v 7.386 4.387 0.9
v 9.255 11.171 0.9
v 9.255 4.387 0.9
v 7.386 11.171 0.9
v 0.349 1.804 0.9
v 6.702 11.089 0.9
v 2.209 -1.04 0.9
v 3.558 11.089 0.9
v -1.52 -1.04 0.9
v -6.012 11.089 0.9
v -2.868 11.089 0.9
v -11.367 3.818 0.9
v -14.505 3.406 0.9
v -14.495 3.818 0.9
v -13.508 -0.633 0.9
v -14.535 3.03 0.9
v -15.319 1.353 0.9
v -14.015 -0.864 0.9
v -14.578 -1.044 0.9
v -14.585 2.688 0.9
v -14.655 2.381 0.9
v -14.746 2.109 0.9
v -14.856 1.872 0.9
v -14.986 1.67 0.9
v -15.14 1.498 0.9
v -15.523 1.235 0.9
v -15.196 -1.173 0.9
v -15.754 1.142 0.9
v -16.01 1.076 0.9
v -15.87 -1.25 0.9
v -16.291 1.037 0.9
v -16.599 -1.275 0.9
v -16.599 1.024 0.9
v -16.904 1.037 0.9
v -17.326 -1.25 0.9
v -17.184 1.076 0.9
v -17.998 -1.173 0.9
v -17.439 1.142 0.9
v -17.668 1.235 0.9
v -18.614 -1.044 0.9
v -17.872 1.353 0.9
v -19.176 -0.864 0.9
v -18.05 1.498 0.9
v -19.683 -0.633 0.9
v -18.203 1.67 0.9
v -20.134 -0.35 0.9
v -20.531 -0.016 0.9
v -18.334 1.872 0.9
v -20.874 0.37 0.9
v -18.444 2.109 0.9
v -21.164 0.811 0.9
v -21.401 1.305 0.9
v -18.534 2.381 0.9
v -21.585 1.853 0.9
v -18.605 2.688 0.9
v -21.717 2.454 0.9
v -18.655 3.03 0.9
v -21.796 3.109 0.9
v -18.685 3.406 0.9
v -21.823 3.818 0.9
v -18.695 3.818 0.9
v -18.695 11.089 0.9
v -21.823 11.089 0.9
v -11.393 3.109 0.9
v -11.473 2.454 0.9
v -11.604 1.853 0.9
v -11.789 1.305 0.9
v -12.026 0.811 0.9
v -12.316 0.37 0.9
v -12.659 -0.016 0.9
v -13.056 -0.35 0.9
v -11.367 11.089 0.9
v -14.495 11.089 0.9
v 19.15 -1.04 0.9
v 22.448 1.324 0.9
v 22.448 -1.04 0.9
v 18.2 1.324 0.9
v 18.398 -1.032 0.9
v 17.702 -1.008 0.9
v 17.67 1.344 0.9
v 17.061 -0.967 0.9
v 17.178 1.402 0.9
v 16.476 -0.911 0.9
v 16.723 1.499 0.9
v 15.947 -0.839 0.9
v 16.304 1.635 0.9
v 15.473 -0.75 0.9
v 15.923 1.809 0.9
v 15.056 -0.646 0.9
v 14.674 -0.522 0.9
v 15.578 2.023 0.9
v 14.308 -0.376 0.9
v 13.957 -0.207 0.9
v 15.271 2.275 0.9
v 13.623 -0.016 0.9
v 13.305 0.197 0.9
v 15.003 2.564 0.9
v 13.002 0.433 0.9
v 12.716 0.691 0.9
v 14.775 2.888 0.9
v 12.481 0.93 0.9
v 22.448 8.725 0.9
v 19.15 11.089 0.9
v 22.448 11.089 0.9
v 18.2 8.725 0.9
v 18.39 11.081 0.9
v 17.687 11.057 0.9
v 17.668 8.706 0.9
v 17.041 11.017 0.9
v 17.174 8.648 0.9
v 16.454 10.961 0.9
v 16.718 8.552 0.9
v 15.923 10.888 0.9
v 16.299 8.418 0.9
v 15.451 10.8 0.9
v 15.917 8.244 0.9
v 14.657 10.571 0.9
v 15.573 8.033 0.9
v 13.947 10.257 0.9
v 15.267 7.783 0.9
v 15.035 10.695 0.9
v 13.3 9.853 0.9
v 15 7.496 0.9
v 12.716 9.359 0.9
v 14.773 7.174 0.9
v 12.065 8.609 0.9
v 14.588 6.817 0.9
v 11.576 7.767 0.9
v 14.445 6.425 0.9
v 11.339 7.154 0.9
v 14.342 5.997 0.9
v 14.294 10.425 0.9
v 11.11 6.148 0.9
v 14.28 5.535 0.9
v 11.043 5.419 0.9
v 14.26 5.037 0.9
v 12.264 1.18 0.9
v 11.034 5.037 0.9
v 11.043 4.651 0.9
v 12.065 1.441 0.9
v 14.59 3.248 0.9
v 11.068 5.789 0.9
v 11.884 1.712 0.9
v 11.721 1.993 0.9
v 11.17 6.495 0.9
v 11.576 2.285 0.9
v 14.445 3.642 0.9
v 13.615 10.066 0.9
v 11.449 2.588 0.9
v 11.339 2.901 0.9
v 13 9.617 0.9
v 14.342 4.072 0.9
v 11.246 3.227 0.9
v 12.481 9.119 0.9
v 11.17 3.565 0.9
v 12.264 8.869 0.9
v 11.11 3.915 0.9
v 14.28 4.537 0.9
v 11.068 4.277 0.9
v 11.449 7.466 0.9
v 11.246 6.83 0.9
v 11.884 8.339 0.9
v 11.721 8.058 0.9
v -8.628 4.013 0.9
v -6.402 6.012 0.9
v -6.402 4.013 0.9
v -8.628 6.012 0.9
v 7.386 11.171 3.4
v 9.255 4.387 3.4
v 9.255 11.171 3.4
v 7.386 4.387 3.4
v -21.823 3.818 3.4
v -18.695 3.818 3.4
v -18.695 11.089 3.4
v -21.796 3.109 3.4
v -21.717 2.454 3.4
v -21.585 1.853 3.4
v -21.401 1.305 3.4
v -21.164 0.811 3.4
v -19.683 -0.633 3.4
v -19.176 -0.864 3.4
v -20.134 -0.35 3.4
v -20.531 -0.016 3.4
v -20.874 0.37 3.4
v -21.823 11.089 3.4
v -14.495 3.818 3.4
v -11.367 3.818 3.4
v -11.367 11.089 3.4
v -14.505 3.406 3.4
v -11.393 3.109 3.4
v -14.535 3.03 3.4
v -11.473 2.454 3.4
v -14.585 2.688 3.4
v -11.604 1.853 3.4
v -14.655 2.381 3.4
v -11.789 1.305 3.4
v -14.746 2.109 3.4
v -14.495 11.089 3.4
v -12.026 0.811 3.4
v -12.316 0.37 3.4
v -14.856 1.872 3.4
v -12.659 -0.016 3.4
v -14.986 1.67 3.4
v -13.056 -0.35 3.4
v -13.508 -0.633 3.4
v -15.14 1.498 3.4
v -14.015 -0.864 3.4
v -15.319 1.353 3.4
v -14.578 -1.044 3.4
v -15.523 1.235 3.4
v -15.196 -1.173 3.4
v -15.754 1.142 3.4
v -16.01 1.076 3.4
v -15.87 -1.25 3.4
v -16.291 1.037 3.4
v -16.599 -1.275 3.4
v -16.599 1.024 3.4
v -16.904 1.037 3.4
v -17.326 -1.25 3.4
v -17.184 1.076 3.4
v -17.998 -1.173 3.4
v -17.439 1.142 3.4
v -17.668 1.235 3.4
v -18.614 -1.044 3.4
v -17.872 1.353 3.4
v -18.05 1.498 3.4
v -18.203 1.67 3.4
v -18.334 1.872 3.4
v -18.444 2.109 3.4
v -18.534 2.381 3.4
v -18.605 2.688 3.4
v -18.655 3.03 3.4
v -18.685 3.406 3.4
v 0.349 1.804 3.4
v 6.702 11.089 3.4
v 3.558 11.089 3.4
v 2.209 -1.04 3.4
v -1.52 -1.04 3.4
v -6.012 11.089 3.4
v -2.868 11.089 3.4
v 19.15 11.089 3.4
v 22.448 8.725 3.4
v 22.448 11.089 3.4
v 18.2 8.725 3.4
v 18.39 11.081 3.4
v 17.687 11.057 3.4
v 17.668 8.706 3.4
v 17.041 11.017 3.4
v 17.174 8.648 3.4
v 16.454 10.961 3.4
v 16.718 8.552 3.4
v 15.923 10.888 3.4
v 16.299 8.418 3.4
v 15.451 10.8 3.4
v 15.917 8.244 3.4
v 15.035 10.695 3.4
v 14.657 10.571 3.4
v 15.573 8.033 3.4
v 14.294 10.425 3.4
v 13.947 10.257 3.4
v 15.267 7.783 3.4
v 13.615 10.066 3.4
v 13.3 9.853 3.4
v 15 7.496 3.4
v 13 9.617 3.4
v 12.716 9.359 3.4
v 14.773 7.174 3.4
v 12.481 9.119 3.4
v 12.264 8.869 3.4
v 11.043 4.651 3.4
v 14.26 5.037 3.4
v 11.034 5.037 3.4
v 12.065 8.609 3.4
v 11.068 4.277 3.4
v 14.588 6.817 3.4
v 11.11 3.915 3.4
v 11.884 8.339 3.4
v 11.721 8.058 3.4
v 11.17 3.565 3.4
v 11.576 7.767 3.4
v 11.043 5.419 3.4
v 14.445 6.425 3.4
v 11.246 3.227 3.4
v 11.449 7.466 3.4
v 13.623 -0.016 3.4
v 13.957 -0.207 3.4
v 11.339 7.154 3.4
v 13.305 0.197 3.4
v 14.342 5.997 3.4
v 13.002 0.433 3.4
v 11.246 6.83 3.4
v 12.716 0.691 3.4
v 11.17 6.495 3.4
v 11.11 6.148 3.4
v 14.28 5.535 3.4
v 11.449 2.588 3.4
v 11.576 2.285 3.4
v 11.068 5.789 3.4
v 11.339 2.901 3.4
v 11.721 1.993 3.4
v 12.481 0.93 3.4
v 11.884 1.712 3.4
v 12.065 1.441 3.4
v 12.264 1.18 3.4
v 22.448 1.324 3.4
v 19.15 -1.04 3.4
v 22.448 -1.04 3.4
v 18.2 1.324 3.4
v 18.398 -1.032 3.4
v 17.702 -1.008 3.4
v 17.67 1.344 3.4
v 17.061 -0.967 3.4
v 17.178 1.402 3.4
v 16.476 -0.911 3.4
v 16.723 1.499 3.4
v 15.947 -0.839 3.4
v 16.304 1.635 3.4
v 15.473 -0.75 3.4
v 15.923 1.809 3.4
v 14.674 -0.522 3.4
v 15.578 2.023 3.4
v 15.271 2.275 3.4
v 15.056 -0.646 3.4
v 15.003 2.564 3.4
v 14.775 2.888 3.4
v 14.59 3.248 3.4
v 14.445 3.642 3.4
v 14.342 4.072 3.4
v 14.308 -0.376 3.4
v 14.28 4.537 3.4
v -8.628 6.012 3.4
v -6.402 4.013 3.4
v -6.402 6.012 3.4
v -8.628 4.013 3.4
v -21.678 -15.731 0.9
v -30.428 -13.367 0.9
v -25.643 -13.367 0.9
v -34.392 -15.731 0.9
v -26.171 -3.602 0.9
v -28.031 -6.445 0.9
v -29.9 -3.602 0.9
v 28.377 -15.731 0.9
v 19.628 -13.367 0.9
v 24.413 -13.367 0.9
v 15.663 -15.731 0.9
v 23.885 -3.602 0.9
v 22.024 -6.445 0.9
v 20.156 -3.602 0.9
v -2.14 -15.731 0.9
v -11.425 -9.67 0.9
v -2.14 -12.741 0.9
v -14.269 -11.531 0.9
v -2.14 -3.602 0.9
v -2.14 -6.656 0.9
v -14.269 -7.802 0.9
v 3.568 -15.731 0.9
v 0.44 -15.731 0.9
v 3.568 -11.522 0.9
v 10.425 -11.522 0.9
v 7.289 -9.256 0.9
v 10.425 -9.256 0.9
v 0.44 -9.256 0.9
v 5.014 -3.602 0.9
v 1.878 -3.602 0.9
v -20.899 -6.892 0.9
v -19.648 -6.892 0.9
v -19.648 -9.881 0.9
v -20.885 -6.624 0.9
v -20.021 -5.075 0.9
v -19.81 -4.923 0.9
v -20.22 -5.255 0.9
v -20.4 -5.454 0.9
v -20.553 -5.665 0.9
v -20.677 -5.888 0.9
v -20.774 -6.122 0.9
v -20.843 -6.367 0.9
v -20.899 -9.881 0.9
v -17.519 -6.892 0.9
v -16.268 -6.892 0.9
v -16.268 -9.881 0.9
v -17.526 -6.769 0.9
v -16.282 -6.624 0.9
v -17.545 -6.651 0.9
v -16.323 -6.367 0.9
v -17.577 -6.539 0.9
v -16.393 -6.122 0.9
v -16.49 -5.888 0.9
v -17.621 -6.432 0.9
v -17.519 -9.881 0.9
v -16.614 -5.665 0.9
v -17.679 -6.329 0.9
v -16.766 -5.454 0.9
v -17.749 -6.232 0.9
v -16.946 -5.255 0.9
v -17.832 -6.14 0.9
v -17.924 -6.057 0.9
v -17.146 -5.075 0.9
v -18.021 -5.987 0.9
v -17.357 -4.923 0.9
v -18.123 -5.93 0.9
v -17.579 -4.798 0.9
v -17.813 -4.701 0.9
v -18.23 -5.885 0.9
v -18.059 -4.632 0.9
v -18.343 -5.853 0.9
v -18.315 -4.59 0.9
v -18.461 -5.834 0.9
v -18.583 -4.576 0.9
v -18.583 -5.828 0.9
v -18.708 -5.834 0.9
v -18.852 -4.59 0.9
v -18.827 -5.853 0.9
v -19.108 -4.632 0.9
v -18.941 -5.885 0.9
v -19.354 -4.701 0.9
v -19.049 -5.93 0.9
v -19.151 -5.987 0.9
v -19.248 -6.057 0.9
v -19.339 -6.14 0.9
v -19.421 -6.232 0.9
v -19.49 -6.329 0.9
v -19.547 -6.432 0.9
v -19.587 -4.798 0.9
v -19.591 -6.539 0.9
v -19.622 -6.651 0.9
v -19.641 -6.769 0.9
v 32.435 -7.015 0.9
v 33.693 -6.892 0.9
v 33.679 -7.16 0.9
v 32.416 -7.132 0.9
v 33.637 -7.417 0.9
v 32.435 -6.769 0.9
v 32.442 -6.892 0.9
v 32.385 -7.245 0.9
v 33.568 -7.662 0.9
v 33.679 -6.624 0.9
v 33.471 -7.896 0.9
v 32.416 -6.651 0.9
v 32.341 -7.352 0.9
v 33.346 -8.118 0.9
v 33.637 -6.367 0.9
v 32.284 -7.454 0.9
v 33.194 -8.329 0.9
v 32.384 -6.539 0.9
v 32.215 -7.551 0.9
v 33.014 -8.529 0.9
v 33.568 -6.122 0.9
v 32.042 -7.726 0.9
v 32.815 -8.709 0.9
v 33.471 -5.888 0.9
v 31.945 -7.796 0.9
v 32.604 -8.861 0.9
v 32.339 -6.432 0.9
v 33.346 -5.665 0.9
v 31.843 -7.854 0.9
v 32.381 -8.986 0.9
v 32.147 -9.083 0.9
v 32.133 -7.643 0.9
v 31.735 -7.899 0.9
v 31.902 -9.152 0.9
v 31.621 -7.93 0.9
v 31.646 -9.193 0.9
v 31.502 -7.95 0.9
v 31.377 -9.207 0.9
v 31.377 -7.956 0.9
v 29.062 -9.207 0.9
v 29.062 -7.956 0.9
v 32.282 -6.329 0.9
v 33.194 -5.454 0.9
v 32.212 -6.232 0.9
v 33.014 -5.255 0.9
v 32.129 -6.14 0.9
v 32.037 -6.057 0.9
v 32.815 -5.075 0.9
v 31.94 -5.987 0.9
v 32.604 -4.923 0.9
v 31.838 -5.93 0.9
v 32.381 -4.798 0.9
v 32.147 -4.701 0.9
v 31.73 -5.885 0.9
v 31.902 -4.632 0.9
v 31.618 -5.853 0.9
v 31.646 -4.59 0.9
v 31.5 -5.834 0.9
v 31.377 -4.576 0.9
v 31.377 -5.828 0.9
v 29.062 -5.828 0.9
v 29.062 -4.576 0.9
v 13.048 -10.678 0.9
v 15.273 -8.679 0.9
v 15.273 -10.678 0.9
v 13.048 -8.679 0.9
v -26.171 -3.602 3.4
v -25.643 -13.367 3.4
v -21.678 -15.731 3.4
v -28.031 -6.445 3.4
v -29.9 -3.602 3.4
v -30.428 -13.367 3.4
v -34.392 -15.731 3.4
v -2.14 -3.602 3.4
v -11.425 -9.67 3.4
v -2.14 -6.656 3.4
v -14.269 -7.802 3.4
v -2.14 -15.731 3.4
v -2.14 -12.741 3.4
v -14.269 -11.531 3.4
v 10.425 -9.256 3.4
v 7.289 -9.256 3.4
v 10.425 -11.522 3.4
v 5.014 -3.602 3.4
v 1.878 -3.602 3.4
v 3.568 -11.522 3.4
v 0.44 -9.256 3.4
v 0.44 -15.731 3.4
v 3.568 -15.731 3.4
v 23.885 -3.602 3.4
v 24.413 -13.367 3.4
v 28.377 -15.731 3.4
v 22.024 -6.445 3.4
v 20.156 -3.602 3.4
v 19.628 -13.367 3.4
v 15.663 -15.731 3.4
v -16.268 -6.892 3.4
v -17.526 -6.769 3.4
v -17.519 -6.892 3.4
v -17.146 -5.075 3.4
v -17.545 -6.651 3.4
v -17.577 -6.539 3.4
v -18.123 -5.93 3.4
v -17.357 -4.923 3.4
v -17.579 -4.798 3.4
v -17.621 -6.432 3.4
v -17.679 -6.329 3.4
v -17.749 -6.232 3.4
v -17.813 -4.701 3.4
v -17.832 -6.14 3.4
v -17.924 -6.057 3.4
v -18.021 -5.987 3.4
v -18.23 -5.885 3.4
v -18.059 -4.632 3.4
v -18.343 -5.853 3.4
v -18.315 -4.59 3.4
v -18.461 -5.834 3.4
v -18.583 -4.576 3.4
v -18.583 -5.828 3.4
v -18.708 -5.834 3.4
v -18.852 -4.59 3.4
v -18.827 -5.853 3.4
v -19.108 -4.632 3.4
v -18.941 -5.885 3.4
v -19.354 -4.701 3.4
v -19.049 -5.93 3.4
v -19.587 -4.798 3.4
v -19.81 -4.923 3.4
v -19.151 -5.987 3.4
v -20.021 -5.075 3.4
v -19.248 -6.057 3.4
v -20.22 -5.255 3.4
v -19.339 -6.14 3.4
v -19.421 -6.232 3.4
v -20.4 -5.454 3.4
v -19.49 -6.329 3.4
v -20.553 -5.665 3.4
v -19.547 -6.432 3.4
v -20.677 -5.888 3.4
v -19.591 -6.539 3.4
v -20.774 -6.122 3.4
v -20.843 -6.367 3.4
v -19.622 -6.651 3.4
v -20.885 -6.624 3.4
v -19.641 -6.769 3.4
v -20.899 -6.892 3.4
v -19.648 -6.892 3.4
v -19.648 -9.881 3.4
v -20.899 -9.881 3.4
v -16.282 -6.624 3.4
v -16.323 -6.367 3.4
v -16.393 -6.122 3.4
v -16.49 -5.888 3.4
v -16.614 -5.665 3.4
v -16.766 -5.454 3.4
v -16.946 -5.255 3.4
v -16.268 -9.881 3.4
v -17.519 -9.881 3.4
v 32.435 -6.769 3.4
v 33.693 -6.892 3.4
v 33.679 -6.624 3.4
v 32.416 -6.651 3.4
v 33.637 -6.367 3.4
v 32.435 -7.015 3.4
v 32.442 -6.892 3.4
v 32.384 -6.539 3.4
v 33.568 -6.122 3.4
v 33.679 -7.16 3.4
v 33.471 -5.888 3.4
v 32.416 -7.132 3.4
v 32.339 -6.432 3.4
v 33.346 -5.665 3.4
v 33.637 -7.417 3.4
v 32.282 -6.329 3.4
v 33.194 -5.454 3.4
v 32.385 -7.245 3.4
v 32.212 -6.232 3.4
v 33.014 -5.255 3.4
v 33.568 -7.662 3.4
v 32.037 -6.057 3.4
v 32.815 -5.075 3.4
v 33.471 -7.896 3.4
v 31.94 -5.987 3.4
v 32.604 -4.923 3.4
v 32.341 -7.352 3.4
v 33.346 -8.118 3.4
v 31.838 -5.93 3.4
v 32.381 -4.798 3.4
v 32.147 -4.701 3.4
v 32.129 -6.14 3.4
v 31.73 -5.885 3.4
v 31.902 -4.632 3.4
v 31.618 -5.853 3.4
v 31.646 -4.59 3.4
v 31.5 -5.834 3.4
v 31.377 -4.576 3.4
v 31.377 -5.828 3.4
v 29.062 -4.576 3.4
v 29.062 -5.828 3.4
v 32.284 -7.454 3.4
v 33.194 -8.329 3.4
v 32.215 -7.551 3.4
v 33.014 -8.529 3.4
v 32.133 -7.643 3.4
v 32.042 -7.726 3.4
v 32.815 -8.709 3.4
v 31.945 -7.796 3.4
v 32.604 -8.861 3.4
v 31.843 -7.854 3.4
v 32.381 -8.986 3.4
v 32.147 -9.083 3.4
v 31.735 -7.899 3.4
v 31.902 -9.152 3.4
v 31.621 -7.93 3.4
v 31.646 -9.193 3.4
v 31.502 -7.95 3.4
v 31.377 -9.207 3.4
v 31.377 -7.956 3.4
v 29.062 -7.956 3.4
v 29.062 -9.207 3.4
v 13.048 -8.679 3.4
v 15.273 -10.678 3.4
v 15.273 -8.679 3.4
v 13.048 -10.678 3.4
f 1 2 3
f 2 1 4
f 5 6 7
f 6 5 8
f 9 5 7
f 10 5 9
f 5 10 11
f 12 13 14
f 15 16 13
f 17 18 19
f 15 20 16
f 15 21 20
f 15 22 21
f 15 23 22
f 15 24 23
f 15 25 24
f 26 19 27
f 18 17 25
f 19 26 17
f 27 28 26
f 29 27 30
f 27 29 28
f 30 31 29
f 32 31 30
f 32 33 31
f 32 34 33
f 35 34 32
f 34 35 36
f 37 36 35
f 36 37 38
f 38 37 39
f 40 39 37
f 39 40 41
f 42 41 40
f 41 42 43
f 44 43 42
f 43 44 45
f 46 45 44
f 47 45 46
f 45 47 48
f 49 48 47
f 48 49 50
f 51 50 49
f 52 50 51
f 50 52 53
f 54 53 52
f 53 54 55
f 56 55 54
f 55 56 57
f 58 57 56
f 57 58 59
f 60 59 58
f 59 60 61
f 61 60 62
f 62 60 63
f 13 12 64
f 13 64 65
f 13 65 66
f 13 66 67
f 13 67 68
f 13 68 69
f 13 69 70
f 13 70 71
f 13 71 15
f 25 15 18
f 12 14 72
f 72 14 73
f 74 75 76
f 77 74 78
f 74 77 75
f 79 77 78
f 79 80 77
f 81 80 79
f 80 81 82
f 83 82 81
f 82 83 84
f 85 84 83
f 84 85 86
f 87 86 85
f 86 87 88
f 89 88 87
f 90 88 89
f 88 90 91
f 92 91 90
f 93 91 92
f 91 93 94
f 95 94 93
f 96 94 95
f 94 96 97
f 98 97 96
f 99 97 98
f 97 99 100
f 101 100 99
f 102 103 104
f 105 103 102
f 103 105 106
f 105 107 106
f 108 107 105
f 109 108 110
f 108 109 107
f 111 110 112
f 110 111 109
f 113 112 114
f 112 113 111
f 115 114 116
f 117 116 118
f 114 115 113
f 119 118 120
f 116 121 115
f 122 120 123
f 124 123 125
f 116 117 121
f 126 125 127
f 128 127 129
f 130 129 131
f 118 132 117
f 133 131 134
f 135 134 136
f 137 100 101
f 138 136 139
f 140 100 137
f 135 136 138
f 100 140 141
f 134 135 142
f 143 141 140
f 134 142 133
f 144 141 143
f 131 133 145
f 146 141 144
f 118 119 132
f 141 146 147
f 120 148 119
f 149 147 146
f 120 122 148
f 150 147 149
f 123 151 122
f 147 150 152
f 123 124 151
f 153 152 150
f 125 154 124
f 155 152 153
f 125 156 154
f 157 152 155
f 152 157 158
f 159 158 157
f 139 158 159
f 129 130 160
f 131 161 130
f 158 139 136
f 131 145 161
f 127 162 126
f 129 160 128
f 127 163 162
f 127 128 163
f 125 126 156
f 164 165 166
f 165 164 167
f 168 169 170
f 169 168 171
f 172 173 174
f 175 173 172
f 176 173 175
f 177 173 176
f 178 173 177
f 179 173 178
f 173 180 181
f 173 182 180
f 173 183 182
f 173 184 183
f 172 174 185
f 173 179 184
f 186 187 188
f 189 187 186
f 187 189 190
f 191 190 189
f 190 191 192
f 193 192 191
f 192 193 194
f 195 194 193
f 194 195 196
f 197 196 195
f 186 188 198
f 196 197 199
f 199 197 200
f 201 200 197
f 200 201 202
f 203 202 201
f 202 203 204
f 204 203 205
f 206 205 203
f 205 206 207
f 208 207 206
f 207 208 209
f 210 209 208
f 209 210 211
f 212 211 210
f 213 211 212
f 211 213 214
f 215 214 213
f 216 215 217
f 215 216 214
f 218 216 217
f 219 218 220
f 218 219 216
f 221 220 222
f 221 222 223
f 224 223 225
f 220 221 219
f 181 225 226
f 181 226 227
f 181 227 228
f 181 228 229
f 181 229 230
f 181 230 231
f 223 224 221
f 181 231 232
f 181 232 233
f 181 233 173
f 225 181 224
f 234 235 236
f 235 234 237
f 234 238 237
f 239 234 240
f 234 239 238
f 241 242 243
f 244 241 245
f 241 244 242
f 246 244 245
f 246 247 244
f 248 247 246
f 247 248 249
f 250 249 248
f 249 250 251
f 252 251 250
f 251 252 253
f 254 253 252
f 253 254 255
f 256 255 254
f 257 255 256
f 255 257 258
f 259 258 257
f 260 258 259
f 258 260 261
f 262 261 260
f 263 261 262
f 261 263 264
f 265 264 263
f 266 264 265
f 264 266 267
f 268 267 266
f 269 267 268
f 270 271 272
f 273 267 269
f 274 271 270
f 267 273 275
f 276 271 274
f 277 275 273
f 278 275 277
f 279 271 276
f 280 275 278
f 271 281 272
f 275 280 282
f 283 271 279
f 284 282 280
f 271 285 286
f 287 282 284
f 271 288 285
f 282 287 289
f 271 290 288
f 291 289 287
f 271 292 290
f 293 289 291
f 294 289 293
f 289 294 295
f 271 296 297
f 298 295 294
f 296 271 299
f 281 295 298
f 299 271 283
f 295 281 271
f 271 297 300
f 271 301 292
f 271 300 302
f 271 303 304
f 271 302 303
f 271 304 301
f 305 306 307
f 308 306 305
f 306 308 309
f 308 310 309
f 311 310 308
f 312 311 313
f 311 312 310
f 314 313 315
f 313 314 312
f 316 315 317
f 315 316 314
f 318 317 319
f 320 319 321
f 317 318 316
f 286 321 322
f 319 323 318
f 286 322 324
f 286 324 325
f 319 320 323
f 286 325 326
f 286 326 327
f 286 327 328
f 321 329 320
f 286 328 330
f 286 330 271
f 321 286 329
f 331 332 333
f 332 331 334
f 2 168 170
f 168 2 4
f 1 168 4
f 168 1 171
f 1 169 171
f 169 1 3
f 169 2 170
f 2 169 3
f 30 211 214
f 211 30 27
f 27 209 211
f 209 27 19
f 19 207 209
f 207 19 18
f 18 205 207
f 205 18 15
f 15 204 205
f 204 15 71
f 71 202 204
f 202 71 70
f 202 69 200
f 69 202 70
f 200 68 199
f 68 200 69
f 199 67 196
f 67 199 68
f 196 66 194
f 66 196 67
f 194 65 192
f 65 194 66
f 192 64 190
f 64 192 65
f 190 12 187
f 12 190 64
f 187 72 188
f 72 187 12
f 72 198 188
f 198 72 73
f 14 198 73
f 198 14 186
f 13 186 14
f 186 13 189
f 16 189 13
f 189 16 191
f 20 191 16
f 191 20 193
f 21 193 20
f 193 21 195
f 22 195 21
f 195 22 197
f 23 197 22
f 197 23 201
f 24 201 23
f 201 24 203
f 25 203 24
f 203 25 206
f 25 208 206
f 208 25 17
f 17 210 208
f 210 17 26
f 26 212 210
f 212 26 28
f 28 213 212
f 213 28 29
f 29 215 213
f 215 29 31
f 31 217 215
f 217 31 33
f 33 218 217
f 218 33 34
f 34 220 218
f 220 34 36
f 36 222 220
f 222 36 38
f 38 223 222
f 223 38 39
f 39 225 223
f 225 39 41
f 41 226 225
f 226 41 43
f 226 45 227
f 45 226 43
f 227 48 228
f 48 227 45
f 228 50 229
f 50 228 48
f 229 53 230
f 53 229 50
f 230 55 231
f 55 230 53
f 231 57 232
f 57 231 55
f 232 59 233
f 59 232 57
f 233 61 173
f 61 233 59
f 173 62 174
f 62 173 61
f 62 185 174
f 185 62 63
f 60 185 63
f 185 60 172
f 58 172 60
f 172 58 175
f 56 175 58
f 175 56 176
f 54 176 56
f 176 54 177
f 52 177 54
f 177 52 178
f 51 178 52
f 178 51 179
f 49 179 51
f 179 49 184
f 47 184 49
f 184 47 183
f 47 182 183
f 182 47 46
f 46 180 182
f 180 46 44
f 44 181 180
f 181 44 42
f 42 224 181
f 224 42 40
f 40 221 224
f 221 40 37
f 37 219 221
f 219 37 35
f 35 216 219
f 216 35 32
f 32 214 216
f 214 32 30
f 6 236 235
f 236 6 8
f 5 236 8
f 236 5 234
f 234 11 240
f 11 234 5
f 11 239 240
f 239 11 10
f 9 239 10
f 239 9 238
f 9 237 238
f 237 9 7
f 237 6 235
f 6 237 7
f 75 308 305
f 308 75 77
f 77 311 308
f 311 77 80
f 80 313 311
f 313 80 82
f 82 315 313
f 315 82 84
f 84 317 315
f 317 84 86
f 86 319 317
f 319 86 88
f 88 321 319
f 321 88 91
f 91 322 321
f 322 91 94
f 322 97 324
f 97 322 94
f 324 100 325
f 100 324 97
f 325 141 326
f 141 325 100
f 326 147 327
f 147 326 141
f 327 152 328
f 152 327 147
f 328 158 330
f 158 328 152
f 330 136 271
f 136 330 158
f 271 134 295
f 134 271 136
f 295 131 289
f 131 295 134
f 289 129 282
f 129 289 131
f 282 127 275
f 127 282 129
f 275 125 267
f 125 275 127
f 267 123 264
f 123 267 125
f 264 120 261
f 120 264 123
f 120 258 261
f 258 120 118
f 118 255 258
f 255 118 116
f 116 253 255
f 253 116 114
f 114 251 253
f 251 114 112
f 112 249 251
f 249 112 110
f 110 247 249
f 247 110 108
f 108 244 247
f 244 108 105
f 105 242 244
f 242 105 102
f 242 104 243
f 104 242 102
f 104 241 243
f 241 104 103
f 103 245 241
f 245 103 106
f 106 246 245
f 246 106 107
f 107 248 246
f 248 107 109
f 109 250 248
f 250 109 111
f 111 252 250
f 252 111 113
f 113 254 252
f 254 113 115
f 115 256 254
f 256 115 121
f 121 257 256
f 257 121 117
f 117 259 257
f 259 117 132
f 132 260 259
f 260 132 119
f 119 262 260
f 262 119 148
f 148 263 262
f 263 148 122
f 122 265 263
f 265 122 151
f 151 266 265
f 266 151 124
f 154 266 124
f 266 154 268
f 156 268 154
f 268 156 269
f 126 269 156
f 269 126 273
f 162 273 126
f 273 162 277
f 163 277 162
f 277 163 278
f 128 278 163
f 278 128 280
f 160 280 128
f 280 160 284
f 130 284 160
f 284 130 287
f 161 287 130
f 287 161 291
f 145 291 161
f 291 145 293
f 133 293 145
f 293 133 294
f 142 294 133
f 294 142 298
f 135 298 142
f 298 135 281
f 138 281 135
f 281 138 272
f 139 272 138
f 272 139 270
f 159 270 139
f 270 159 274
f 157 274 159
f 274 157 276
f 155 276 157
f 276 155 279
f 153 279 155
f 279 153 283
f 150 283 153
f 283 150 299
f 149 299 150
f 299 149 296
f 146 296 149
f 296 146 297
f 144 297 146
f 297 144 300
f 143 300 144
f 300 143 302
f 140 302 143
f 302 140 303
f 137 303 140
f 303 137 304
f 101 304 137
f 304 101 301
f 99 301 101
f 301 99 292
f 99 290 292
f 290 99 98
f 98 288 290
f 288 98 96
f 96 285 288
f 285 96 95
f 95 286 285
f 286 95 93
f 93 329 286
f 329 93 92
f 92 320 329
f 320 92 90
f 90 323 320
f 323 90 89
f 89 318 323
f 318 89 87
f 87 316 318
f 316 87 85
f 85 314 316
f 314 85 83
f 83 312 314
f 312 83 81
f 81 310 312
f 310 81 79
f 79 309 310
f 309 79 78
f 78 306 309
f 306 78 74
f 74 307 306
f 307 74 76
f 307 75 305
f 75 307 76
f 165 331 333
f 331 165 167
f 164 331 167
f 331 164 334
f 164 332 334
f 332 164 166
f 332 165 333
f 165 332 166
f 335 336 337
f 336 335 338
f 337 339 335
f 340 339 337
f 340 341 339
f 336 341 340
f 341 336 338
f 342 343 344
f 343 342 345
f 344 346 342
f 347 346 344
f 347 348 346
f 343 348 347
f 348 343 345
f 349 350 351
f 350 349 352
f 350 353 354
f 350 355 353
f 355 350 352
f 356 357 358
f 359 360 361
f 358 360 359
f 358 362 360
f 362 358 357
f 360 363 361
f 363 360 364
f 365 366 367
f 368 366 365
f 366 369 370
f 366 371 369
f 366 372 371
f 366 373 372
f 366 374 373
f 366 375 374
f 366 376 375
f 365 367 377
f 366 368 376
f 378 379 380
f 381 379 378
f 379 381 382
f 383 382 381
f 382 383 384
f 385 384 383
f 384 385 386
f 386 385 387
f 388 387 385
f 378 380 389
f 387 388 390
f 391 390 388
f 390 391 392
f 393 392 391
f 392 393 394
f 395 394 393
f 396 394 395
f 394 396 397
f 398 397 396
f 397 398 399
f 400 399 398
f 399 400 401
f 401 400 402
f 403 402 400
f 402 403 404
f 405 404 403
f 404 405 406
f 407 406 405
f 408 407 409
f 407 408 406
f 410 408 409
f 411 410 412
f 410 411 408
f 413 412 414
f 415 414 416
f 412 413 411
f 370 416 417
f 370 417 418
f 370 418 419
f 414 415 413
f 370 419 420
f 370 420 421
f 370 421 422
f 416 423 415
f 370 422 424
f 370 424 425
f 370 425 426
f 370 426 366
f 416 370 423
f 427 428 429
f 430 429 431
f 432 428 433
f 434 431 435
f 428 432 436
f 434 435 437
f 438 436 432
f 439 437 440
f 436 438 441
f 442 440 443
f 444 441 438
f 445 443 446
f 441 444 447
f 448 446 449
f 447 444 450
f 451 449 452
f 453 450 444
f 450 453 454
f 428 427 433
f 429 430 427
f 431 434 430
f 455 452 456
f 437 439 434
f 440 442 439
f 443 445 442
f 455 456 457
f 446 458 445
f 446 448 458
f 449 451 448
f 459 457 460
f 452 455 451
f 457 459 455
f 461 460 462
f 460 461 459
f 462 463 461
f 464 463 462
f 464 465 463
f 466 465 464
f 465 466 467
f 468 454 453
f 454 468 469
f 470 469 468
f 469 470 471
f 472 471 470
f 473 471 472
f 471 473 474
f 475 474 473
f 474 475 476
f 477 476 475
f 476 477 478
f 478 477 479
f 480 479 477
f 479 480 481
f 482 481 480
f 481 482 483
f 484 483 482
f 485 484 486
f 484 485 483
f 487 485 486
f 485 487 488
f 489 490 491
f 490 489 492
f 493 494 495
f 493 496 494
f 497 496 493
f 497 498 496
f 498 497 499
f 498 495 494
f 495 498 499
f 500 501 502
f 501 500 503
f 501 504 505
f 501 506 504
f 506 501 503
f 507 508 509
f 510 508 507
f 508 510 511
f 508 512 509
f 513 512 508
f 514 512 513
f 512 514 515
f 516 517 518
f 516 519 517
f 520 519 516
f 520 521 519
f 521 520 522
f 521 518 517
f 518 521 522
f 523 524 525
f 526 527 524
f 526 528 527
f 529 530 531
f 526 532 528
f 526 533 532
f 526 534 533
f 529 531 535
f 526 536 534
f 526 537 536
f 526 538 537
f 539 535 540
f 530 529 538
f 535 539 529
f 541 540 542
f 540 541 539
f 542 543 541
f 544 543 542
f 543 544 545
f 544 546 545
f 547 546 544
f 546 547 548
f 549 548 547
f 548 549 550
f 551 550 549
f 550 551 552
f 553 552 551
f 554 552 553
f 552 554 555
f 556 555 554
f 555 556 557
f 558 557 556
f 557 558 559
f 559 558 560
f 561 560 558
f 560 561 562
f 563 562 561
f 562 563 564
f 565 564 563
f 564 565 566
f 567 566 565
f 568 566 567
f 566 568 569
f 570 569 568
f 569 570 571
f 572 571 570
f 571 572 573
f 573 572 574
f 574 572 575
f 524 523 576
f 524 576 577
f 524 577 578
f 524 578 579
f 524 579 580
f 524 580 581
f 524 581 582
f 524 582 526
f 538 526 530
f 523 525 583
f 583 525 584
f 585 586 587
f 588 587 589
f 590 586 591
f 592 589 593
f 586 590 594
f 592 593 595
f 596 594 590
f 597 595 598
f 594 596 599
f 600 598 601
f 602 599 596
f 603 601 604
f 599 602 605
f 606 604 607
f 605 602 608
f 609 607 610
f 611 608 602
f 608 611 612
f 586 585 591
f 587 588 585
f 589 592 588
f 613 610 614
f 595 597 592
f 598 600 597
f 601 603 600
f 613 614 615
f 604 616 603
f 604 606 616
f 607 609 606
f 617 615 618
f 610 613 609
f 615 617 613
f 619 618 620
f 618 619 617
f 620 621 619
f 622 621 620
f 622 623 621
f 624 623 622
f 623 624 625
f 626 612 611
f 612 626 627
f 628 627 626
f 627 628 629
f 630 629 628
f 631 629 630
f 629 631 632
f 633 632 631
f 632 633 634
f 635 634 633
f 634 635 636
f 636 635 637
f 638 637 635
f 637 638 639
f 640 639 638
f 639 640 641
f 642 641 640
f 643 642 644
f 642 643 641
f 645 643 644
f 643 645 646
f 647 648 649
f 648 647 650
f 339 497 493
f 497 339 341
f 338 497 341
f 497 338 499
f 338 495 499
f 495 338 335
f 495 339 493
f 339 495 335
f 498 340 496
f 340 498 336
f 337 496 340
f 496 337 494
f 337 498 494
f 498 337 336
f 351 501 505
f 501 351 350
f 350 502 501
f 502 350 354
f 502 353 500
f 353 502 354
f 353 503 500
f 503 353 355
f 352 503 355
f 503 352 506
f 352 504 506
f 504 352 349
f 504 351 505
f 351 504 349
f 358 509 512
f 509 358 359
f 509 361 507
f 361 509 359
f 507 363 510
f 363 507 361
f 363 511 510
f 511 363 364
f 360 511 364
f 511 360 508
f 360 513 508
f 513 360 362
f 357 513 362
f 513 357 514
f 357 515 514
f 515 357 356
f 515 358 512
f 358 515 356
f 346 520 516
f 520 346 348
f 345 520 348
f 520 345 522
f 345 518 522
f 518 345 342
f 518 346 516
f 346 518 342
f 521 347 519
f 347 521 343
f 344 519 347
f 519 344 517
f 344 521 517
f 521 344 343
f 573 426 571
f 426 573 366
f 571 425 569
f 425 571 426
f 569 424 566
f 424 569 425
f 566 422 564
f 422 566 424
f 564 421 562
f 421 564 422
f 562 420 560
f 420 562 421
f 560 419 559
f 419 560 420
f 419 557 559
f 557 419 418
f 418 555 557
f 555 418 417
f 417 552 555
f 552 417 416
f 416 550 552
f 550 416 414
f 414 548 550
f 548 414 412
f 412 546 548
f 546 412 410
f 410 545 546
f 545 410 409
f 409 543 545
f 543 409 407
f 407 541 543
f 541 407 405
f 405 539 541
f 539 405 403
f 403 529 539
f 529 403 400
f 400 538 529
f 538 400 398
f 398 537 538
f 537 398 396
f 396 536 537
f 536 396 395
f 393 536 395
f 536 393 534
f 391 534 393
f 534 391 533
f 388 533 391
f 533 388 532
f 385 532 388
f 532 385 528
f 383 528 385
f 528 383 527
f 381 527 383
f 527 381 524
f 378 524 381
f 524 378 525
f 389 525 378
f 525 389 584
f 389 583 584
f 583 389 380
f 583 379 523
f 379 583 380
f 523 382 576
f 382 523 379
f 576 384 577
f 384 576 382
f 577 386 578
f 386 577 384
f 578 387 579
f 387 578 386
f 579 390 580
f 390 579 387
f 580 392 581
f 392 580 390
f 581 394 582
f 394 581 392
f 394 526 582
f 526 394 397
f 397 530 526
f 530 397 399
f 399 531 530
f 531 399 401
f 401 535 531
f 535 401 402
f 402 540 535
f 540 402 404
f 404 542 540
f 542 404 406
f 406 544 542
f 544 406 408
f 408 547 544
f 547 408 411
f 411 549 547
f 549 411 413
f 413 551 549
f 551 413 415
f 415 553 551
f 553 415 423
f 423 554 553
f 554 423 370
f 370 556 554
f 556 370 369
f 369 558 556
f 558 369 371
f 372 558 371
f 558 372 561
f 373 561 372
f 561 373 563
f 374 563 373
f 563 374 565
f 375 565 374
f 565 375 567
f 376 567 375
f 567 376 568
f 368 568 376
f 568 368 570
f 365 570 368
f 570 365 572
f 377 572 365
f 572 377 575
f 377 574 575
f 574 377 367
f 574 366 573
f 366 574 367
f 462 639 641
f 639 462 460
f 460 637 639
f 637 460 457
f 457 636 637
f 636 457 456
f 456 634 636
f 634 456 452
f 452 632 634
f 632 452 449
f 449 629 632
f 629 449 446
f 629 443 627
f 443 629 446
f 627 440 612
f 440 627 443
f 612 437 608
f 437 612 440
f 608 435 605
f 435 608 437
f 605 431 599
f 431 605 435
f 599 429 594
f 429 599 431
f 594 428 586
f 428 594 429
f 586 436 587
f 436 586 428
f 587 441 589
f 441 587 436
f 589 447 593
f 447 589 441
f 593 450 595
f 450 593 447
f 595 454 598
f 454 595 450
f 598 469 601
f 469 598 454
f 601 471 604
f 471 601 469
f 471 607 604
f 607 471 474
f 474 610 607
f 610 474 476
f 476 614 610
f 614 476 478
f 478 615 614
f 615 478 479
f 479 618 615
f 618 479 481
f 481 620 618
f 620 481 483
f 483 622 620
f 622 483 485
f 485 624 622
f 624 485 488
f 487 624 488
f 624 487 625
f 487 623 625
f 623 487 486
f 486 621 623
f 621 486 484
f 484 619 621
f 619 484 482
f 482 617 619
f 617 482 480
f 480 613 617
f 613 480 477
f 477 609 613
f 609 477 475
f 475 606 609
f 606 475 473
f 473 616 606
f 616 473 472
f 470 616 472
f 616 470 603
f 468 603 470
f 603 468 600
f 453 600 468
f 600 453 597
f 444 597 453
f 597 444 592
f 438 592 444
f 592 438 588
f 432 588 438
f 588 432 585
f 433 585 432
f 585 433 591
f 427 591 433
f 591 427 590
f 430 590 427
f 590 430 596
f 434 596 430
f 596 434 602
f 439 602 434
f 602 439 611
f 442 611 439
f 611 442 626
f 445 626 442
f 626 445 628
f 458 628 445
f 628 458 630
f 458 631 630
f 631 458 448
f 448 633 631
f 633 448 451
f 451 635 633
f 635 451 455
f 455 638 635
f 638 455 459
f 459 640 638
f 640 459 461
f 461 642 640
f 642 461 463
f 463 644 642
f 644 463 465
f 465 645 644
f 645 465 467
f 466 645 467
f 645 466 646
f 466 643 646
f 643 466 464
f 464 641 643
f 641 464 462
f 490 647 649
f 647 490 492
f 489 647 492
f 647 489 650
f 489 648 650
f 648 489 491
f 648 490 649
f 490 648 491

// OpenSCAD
$fn = 48;
  // syllabics (overlaid on icon, tallest)
  translate([0, 4.808, 0.900]) linear_extrude(height=2.500) text("ᑌᐺᑊᑕ", size=11.980, halign="center", valign="center", font="Euphemia UCAS:style=Bold");
  translate([0, -9.808, 0.900]) linear_extrude(height=2.500) text("ᐃᐢᐸᔨᐎᐣ", size=11.980, halign="center", valign="center", font="Euphemia UCAS:style=Bold");
